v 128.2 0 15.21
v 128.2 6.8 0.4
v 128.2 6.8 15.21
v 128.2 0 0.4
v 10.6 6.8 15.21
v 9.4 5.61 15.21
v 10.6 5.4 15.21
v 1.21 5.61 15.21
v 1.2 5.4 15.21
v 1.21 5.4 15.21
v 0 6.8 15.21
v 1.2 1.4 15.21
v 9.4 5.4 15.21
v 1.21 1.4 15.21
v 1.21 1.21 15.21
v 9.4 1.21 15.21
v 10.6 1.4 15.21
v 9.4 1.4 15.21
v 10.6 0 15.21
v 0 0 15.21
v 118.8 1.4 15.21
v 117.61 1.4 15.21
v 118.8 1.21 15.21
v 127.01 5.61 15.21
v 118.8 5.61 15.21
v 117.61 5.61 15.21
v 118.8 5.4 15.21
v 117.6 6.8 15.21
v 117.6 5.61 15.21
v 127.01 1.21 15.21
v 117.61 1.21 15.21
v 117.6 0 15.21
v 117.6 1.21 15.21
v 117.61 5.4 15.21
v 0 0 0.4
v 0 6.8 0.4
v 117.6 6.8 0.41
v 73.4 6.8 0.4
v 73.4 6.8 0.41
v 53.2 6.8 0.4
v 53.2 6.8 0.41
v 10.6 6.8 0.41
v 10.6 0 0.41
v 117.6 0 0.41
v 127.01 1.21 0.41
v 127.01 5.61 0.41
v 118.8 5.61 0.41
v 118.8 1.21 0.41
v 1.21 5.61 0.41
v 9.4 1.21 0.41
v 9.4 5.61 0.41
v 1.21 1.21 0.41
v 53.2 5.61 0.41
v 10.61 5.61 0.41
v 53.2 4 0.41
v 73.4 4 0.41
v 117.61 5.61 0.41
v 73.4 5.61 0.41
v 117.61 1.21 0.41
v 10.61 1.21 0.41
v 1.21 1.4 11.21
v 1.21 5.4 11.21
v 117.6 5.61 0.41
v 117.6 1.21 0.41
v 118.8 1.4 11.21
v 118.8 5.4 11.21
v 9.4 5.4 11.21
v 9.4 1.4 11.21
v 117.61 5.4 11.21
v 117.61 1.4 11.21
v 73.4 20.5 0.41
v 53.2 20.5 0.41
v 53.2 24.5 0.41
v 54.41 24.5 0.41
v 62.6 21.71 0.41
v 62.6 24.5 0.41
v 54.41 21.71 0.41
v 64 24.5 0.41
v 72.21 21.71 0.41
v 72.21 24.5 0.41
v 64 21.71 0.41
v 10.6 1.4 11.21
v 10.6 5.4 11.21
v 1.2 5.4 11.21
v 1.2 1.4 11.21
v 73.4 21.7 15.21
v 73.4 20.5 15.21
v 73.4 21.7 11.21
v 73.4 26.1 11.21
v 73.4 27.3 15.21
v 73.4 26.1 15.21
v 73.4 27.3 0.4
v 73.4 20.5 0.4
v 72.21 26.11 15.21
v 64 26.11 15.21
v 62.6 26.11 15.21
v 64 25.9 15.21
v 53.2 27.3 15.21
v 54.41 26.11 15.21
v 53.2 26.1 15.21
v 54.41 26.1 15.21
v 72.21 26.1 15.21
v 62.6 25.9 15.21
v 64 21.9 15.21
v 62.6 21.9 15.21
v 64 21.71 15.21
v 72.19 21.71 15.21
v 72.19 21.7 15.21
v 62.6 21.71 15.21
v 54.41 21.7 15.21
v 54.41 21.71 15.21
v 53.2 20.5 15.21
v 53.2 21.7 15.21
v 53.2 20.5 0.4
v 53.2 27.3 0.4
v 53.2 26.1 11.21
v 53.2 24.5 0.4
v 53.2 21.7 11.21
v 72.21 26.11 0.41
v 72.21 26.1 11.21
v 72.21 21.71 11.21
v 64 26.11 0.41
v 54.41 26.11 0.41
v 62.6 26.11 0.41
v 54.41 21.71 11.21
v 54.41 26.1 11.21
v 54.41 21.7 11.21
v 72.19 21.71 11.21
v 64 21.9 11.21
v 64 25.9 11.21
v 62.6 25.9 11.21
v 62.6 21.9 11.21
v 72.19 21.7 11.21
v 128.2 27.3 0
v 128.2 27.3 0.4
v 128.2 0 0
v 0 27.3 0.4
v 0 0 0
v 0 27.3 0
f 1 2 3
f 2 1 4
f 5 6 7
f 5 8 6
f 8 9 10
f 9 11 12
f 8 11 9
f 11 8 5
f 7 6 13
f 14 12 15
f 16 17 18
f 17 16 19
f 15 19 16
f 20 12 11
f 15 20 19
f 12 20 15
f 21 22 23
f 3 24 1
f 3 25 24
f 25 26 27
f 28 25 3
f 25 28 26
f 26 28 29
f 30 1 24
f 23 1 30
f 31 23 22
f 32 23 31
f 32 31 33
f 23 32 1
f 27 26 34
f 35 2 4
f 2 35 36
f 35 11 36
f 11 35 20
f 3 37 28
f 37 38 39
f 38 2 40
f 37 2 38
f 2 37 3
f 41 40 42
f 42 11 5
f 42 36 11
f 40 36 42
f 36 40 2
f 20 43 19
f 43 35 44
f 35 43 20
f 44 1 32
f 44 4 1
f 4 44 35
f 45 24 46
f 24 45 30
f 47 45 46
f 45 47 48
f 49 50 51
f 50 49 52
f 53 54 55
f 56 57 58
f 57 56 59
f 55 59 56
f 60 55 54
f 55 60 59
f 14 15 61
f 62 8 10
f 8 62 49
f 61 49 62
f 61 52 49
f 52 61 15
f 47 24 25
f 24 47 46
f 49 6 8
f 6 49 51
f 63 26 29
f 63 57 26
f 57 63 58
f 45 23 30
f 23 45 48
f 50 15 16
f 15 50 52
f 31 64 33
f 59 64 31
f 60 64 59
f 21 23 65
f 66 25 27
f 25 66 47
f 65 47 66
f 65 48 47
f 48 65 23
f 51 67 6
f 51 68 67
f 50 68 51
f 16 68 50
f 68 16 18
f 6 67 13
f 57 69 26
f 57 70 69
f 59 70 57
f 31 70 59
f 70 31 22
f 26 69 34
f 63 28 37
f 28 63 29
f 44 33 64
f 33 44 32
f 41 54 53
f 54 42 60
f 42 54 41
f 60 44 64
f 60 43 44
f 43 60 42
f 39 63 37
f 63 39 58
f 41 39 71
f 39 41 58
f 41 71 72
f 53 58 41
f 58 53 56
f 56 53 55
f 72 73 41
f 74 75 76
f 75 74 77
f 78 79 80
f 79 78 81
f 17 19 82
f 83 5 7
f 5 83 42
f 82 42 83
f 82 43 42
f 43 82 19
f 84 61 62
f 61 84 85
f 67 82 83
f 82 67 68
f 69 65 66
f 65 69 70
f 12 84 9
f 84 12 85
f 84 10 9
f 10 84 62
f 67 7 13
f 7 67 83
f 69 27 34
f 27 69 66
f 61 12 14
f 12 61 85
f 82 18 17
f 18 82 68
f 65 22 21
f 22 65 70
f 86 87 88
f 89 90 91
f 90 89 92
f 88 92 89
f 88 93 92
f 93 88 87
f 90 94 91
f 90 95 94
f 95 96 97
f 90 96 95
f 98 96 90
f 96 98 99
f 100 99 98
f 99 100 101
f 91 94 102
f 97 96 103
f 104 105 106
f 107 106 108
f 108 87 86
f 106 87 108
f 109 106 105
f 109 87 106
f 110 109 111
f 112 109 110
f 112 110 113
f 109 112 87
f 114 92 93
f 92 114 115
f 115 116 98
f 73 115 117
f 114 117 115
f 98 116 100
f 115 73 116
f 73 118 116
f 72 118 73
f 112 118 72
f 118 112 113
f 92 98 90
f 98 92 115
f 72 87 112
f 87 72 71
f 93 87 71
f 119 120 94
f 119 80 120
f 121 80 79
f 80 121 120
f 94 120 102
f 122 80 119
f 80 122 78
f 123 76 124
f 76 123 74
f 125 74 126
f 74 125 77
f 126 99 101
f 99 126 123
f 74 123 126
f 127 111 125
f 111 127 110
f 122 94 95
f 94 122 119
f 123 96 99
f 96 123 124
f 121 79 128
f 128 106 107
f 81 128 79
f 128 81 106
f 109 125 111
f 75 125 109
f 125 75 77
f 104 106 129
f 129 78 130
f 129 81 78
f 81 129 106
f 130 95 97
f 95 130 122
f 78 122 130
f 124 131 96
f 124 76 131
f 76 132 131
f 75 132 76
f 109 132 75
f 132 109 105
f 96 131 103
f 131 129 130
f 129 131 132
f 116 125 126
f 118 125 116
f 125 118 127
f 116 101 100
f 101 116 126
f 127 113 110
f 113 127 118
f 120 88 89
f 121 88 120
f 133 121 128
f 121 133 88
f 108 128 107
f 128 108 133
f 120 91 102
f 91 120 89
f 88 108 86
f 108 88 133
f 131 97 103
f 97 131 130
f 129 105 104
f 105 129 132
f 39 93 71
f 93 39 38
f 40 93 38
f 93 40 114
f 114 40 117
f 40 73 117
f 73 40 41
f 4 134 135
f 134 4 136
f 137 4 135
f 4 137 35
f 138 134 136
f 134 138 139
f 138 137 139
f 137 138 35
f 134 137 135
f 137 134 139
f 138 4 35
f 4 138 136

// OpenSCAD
// file: ../../Base/Rotation.scad
// Fischertechnik Box Foundation
// Geometry Helpers Rotation

include <PlacementOptions.scad>

// getRotatedSpace(space, rotation=NoRotation)
// Rotates the space dependent on the specified rotation

function getRotatedSpace(space, rotation=NoRotation) = [
    (rotation == Rotate90 || rotation == Rotate270) ? space.y : space.x,
    (rotation == Rotate90 || rotation == Rotate270) ? space.x : space.y
];

// Rotates the given space around the fixed left lower corner
// space = the space the children needs as width/depth list [width,depth]
// rotation = 0 Rotate0 degrees, 1 Rotate90 degrees, 2 Rotate180 degrees, 3 Rotate270 degrees (equivalent to -90)

module RotateFix(space, rotation=NoRotation) {
    dy = (rotation == Rotate0 || rotation == Rotate270) ? 0 :
        (rotation == Rotate90) ? space.x :
        space.y;
    dx = (rotation < Rotate180) ? 0 :
        (rotation == Rotate180) ? space.x :
        space.y;
    
    translate([dx, dy, 0])
        rotate([0, 0, rotations[rotation]])
            children();
}
// file: ../../Base/Alignment.scad
// Fischertechnik Box Foundation
// Geometry Helpers Alignment

include <PlacementOptions.scad>

// getAlignedX(elementWidth, spaceWidth, align=AlignRight, offset=0)
// Gets the aligned X offset of an element with the given
// width in the given space.
// elementWidth = The width of the element to positon
// spaceWidth = The space where the element should be aligned
// align = 0 AlignLeft, 1 AlignCenter, 2 AlignRight
// offset = an optional offset from the aligned position. When
// aligned left or centered, then positive values are in X direction.
// When aligned right then positive values are in negative X direction.

function getAlignedX(elementWidth, spaceWidth, align=AlignRight, offset=0) =
    (align == AlignLeft) ?
        offset :
        ((align == AlignCenter) ?
        (spaceWidth - elementWidth)/2 + offset :
        spaceWidth - offset - elementWidth);

// getAlignedY(elementDepth, spaceDepth, align=AlignTop, offset=0)
// Gets the aligned Y offset of an element with the given
// depth in the given space.
// elementDepth = The depth of the element to positon
// spaceDepth = The space where the element should be aligned
// align = 0 AlignBottom, 1 AlignCenter, 2 AlignTop
// offset = an optional offset from the aligned position. When
// aligned bottom or centered, then positive values are in Y direction.
// When aligned top then positive values are in negative Y direction.

function getAlignedY(elementDepth, spaceDepth, align=AlignTop, offset=0) =
    (align == AlignBottom) ?
        offset :
        ((align == AlignCenter) ?
        (spaceDepth - elementDepth)/2 + offset :
        spaceDepth - offset - elementDepth);
// file: ../../Base/PlacementOptions.scad
// Fischertechnik Box Foundation
// Placement Options

// Alignment
NoAlign = 0;
AlignLeft = 1;
AlignBottom = 2;
AlignCenter = 3;
AlignRight = 4;
AlignTop = 5;

// Element rotation degree steps
rotations = [0, -90, -180, -270];

// Rotation
NoRotation = 0;
Rotate0 = 0;
Rotate90 = 1;
Rotate180 = 2;
Rotate270 = 3;

// Docking (seen from above)
NoDock = -1;
DockLeft = 0;
DockTop = 1;
DockRight = 2;
DockCorner = 2;
DockBottom = 3;

// Web corners
LowerLeft = 0;
UpperLeft = 1;
UpperRight = 2;
LowerRight = 3;

// Web position relative to corner
LeftOfCorner = 0;
RightOfCorner = 1;
// file: ../../Base/Boxes.scad
// Fischertechnik Box Foundation
// Pre-designed Boxes

use <Constants.scad>

include <PlacementOptions.scad>

box190Width = 190;
box190Depth = 130;
box130Width = 130;
box130Depth = 95;

// Values are from an original ec3 box
topBottomDifference = 1.5;
outerHeight = 40;
innerHeight = 38.2;
baseThickness = outerHeight - innerHeight;
stackExcess = 5.7;
radius = 3.5;
wallThickness = 1.5;
tolerance = 0.2;
stackOffset = innerHeight - stackExcess;

boxUsageHeight = stackOffset;
boxWallThickness = wallThickness;
boxBaseThickness = baseThickness;
boxWebWidth = 3.0;

// getBoxWallThickness()
// Gets the wall thickness of a Fischertechnik Box
function getBoxWallThickness() = boxWallThickness;

// getBoxUsageHeight()
// Gets the usable height of a Fischertechnik box
function getBoxUsageHeight() = boxUsageHeight;

// getBoxInnerHeight()
// Gets the inner height of a Fischertechnik box, including the stack excess
function getBoxInnerHeight() = innerHeight;

// getBoxBaseThickness()
// Gets the thickness of the Fischertechnik box base.
function getBoxBaseThickness() = boxBaseThickness;

// getBoxWebWidth()
// Gets the width of a box web
function getBoxWebWidth() = boxWebWidth;

// getBox190Space()
// Gets the usable inner space of a Box 190 as an x/y-list
function getBox190Space() = [
    box190Width - 2*getBoxWallThickness() - topBottomDifference, 
    box190Depth - 2*getBoxWallThickness() - topBottomDifference ];

// BoxBase(width, depth)
// Creates an empty stackable Fischertechnik compatible box
// width = Outer width of the box (190, 130, ...)
// depth = Outer depth of the box (130, 95, ...)

module BoxBase(width, depth, height=outerHeight) {    
    thinPlate = 0.01;

    innerHeight = height - baseThickness;    
    
    module BodyPlate(width, depth) {
        translate([radius, radius])
        hull() {
            w = width-2*radius;
            d = depth-2*radius;
            cube([w, d, thinPlate]);
            cylinder(thinPlate, r=radius, $fn=getFragments());
            translate([w, 0])
                cylinder(thinPlate, r=radius, $fn=getFragments());
            translate([w, d])
                cylinder(thinPlate, r=radius, $fn=getFragments());
            translate([0, d])
                cylinder(thinPlate, r=radius, $fn=getFragments());
        }
    }
    
    module Body(tolerance=tolerance) {
        hull() {
            // Bottom with tolerance to fit into the original boxes when stacked
            translate([-wallThickness+tolerance, -wallThickness+tolerance, -baseThickness])
                BodyPlate(width-topBottomDifference-2*tolerance, depth-topBottomDifference-2*tolerance);
            
            // Top
            translate([-wallThickness-topBottomDifference/2, -wallThickness-topBottomDifference/2, innerHeight-thinPlate])
                BodyPlate(width, depth);
         }
    }

    module Cutoff() {
        hull() {
            coWidth = width - 2*wallThickness;
            coDepth = depth - 2*wallThickness;
            
            // Bottom
            BodyPlate(coWidth-topBottomDifference, coDepth-topBottomDifference);

            // Top
            translate([-topBottomDifference/2, -topBottomDifference/2, innerHeight+thinPlate]) 
                BodyPlate(coWidth, coDepth);
        }
    }
    
    difference() {        
        Body();
        Cutoff();
        stackOffset = innerHeight - stackExcess;
        translate([0, 0, stackOffset + baseThickness])
            Body(tolerance=0);
    }
}

// Creates the Fischertechnik empty box 130x190 mm and places it at position 0,0
// 190x130 are the outer sizes, the inner space is slightly smaller. Use getBox190Space() to get the inner sizes.
// The box is positioned that the usable inner space is at the 0,0,0 position. The

module Box190() {
    BoxBase(box190Width, box190Depth);
}

// Gets the usable inner space of a Box 130 as an x/y-list
function getBox130Space() = [
    box130Width - 2*getBoxWallThickness() - topBottomDifference, 
    box130Depth - 2*getBoxWallThickness() - topBottomDifference ];

// Creates the Fischertechnik empty box 95x130 mm and places it at position 0,0
// 190x130 are the outer sizes, the inner space is slightly smaller. Use getBox190Space() to get the inner sizes.
// The box is positioned that the usable inner space is at the 0,0,0 position. The

module Box130() {
    BoxBase(box130Width, box130Depth);
}

// Creates a web at the specified box walls
// corner 0 = LowerLeft, 1 = UpperLeft, 2 = UpperRight, 3 = LowerRight
// side 0 = LeftOfCorner, 1 = RightOfCorner
// distance = Distance in mm from the corner
// boxSpace = inner width and depth of the box (default: Box 190)
// webWidth = length of the web (default is 3 mms)
// webThickness = thickness of the web (default is 1 mm)

module BoxWeb(corner, side, distance, boxSpace=getBox190Space(), webWidth=getBoxWebWidth(), webThickness=1.0) {
    sink = getBoxWallThickness()/2;

    width = (corner % 2 == 0) ? 
            (side == LeftOfCorner ? webWidth : webThickness) :
            (side == LeftOfCorner ? webThickness : webWidth);

    depth = (corner % 2 == 0) ? 
            (side == RightOfCorner ? webWidth : webThickness) :
            (side == RightOfCorner ? webThickness : webWidth);
    
    xDiff = corner == LowerLeft ? 
                (side == LeftOfCorner ? -sink : distance) :
            (corner == UpperLeft ?                
                (side == LeftOfCorner ? distance : -sink) :
            (corner == UpperRight ?
                (side == LeftOfCorner ? boxSpace.x-webWidth+sink : boxSpace.x-distance-webThickness) :
                (side == LeftOfCorner ? boxSpace.x-distance-webThickness: boxSpace.x-webWidth+sink)));

    yDiff = corner == LowerLeft ? 
                (side == RightOfCorner ? -sink : distance) :
            (corner == UpperLeft ?
                (side == RightOfCorner ? boxSpace.y-distance : boxSpace.y-webWidth+sink) :
            (corner == UpperRight ?
                (side == RightOfCorner ? boxSpace.y-webWidth+sink : boxSpace.y-distance) :
                (side == RightOfCorner ? distance : -sink)));
    
    translate([xDiff, yDiff, -getExcess()])
        cube([width, depth, boxUsageHeight + 2*getExcess()]);
}
// file: ../../Base/Placement.scad
// Fischertechnik Box Foundation
// Geometry Helpers Placement

use <Constants.scad>
use <Alignment.scad>
use <Rotation.scad>
use <Boxes.scad>

include <PlacementOptions.scad>

// Place(x=0, y=0, elementSpace=[0,0], alignX=AlignLeft, alignY=AlignBottom, rotation=Rotate0, boxSpace=getBox190Space())
// Places the child at the specified position
// y = Y-Position. This is a relative position when an X aligment is specified.
// x = X-Position. This is a relative position when an Y aligment is specified.
// elementSpace = space of the element to be placed [x,y]
// alignX = -1=NoAlign, 0 AlignLeft, 1 AlignCenter, 3 AlignRight (elementSpace and boxSpace required!)
// alignY = -1=NoAlign, 2 AlignBottom, 1 AlignCenter, 4 AlignTop (elementSpace and boxSpace required!)
// rotation = 0 Rotate0 0 degrees, 1 Rotate90 90 degrees, 
// 2 Rotate180 180 degrees, 3 Rotate270 270 degrees (equivalent to -90)
// boxSpace = Inner space of the box where the placement occurs [x,y] - default is Box 190x130 inner space

module Place(x=0, y=0, elementSpace=[0,0], 
  alignX=AlignLeft, alignY=AlignBottom, 
  rotation=NoRotation, boxSpace=getBox190Space()) {

    module Position(x, y, space, rotation=Rotate0) {
        translate([x, y, 0])
            RotateFix(space, rotation)
                children();
    }

    space = getRotatedSpace(elementSpace, rotation);
    alignedX = getAlignedX(space.x, boxSpace.x, alignX, x);
    alignedY = getAlignedY(space.y, boxSpace.y, alignY, y);
    Position(alignedX, alignedY, elementSpace, rotation)
        children();
}

// Center(space=getBox130Space(), elementSpace=[0,0])
// space = Space where the children is centered. For cylinder use centered=true and no elementSpace.
// elementSpace = space of the element to be centered [x,y]

module Center(space=getBox190Space(), elementSpace=[0,0]) {
    Place(elementSpace=elementSpace, boxSpace=space, alignX=AlignCenter, alignY=AlignCenter)
        children();
}

// CenterHorizontal(width=0, y=0, offset=0, space=getBox130Space())
// width = Width of the element to be placed.
// y = Y position of the element
// offset = Offset from the center position (negative will be left of the center)
// space = Space where the element is placed

module CenterHorizontal(width=0, y=0, offset=0, space=getBox190Space()) {
    Place(x=offset, y=y, elementSpace=[width, 0], boxSpace=space, alignX=AlignCenter)
        children(0);
}

// CenterVertical(depth=0, x=0, offset=0, space=getBox130Space())
// depth = Depth of the element to be placed.
// x = X position of the element
// offset = Offset from the center position (negative will be down of the center)
// space = Space where the element is placed

module CenterVertical(depth=0, x=0, offset=0, space=getBox190Space()) {
    Place(x=x, y=offset, elementSpace=[0, depth], boxSpace=space, alignY=AlignCenter)
        children(0);
}

// getIsVertical(align)
// True if the specified alignment needs a vertical orientation for a divider (AlignRight, AlignLeft)

function getIsVertical(align) = (align == AlignRight || align == AlignLeft);

// getIsHorizontal(align)
// True if the specified alignment needs a horizontal orientation for a divider (AlignTop, AlignBottom)

function getIsHorizontal(align) = (align == AlignTop || align == AlignBottom);
// file: ../../Elements/AxisClip10.scad
// Fischertechnik Box Library
// Axis for clip 10
// 31023

use <../ModelBase/Simple.scad>
use <../Base/Constants.scad>

width = 12;
depth = 12;
height = 23;
upperDiameter = 3.6;
clipHeight = 10;

// getAxisClip10Space()
// Gets the space of a frame for a clip 10 with spring ring (mot2)

function getAxisClip10Space() = [width, depth, height];

// AxisClip10(height, clipHeight)
// Axis for clip 10 with spring ring (mot2)
// height = Height of the complete axis
// clipHeight = Height of the rt for the clip (standard is 10, in mot3 its only 7)

module AxisClip10(height=height, clipHeight=clipHeight) {
    LeveledAxisWithSpace(height, height-clipHeight, getAxisClip10Space(), diameter=upperDiameter);
}

// Tests
color("lightgray")
AxisClip10();
// file: ../../Base/Constants.scad
// Fischertechnik Box Foundation
// Constants

// Constant values necessary for multiple elements

// Base constants
dividerThickness = 1.2;
excess = 0.01;
fragments = 90;
tolerance = 0.8;

// Gets the thickness of a divider 
function getDividerThickness() = dividerThickness;

// Gets the excess that is used to merge walls into each other
function getExcess() = excess;

// Gets amount of fragments of a cylinder
function getFragments() = fragments;

// Gets the inner tolerance of a frame to each side
function getTolerance() = tolerance;


// Fischertechnik specific constants
axisDiameter = 4;
axisBottomDiameter = axisDiameter + 1;
standardEdgeDistance = 2.5;
standardWebDistance = 11.5;
standardCornerLength = 15;
tubeWallFactor = 0.8;
smallPartsFrameHeight = 20;

// Gets axis diameter
function getAxisDiameter() = axisDiameter;

// Gets axis bottom diameter for thicker part at the bottom
function getAxisBottomDiameter() = axisBottomDiameter;

// gets the standard distance to the wall of the box for dockable frames with webs
function getStandardEdgeDistance() = standardEdgeDistance;

// gets the standard distance of each web to the corner of the dockable frame
function getStandardWebDistance() = standardWebDistance;

// gets the standard length of the corner walls of a dockable frame
function getStandardCornerLength() = standardCornerLength;

// gets the wall thickness of a tube.
function getTubeWallThickness() = tubeWallFactor * getDividerThickness();

// gets the frame height for docked small parts boxes.
function getSmallPartsFrameHeight() = smallPartsFrameHeight;
// file: ../../Elements/FrameCrankedAxis.scad
// Fischertechnik Box Library
// Frame for single Cranked Axis
// 31080

use <../Base/Constants.scad>
use <../ModelBase/Simple.scad>
use <../ModelBase/Complex.scad>

length = 125;
holderOffset = 20.5;

// getFrameCrankedAxisSpace()
// Gets the space (.x, .y) the holder for the cranked axis needs

function getFrameCrankedAxisSpace() = [getFrameAxisSpace(length).x, holderOffset + getFrameAxisSpace(length).y];

// FrameCrankedAxis()
// Holder for a single cranked axis

module FrameCrankedAxis() {
    FrameAxis(length);
    
    holderLength = 17 + 2*getDividerThickness();
    xOffset = ((length + getTolerance()) - holderLength)/2;
    yOffset = getAxisDiameter();

    spaceWidth = holderLength + getTolerance();
    
    translate([xOffset, yOffset, 0]) {
        Space([spaceWidth, holderOffset]);
    }
    
    translate([xOffset, holderOffset, 0]) {
        FrameAxis(holderLength, true);
    }
}

// Tests
color("lightgray") {
FrameCrankedAxis();
}
// file: ../TestPrint.scad
// 3D Print Test Base

use <../Base/Constants.scad>

use <../Elements/AxisClip10.scad>

module TestPrint(elementSpace) {
    cube([elementSpace.x, elementSpace.y, 0.4]);
    translate([0,0,0.4+getExcess()]) {
        children();
    }
}

TestPrint(getAxisClip10Space())
    AxisClip10();
// main file
// 3D Print Test Base
// FrameCrankedAxis

use <../TestPrint.scad>
use <../../Elements/FrameCrankedAxis.scad>

TestPrint(getFrameCrankedAxisSpace())
    FrameCrankedAxis();
